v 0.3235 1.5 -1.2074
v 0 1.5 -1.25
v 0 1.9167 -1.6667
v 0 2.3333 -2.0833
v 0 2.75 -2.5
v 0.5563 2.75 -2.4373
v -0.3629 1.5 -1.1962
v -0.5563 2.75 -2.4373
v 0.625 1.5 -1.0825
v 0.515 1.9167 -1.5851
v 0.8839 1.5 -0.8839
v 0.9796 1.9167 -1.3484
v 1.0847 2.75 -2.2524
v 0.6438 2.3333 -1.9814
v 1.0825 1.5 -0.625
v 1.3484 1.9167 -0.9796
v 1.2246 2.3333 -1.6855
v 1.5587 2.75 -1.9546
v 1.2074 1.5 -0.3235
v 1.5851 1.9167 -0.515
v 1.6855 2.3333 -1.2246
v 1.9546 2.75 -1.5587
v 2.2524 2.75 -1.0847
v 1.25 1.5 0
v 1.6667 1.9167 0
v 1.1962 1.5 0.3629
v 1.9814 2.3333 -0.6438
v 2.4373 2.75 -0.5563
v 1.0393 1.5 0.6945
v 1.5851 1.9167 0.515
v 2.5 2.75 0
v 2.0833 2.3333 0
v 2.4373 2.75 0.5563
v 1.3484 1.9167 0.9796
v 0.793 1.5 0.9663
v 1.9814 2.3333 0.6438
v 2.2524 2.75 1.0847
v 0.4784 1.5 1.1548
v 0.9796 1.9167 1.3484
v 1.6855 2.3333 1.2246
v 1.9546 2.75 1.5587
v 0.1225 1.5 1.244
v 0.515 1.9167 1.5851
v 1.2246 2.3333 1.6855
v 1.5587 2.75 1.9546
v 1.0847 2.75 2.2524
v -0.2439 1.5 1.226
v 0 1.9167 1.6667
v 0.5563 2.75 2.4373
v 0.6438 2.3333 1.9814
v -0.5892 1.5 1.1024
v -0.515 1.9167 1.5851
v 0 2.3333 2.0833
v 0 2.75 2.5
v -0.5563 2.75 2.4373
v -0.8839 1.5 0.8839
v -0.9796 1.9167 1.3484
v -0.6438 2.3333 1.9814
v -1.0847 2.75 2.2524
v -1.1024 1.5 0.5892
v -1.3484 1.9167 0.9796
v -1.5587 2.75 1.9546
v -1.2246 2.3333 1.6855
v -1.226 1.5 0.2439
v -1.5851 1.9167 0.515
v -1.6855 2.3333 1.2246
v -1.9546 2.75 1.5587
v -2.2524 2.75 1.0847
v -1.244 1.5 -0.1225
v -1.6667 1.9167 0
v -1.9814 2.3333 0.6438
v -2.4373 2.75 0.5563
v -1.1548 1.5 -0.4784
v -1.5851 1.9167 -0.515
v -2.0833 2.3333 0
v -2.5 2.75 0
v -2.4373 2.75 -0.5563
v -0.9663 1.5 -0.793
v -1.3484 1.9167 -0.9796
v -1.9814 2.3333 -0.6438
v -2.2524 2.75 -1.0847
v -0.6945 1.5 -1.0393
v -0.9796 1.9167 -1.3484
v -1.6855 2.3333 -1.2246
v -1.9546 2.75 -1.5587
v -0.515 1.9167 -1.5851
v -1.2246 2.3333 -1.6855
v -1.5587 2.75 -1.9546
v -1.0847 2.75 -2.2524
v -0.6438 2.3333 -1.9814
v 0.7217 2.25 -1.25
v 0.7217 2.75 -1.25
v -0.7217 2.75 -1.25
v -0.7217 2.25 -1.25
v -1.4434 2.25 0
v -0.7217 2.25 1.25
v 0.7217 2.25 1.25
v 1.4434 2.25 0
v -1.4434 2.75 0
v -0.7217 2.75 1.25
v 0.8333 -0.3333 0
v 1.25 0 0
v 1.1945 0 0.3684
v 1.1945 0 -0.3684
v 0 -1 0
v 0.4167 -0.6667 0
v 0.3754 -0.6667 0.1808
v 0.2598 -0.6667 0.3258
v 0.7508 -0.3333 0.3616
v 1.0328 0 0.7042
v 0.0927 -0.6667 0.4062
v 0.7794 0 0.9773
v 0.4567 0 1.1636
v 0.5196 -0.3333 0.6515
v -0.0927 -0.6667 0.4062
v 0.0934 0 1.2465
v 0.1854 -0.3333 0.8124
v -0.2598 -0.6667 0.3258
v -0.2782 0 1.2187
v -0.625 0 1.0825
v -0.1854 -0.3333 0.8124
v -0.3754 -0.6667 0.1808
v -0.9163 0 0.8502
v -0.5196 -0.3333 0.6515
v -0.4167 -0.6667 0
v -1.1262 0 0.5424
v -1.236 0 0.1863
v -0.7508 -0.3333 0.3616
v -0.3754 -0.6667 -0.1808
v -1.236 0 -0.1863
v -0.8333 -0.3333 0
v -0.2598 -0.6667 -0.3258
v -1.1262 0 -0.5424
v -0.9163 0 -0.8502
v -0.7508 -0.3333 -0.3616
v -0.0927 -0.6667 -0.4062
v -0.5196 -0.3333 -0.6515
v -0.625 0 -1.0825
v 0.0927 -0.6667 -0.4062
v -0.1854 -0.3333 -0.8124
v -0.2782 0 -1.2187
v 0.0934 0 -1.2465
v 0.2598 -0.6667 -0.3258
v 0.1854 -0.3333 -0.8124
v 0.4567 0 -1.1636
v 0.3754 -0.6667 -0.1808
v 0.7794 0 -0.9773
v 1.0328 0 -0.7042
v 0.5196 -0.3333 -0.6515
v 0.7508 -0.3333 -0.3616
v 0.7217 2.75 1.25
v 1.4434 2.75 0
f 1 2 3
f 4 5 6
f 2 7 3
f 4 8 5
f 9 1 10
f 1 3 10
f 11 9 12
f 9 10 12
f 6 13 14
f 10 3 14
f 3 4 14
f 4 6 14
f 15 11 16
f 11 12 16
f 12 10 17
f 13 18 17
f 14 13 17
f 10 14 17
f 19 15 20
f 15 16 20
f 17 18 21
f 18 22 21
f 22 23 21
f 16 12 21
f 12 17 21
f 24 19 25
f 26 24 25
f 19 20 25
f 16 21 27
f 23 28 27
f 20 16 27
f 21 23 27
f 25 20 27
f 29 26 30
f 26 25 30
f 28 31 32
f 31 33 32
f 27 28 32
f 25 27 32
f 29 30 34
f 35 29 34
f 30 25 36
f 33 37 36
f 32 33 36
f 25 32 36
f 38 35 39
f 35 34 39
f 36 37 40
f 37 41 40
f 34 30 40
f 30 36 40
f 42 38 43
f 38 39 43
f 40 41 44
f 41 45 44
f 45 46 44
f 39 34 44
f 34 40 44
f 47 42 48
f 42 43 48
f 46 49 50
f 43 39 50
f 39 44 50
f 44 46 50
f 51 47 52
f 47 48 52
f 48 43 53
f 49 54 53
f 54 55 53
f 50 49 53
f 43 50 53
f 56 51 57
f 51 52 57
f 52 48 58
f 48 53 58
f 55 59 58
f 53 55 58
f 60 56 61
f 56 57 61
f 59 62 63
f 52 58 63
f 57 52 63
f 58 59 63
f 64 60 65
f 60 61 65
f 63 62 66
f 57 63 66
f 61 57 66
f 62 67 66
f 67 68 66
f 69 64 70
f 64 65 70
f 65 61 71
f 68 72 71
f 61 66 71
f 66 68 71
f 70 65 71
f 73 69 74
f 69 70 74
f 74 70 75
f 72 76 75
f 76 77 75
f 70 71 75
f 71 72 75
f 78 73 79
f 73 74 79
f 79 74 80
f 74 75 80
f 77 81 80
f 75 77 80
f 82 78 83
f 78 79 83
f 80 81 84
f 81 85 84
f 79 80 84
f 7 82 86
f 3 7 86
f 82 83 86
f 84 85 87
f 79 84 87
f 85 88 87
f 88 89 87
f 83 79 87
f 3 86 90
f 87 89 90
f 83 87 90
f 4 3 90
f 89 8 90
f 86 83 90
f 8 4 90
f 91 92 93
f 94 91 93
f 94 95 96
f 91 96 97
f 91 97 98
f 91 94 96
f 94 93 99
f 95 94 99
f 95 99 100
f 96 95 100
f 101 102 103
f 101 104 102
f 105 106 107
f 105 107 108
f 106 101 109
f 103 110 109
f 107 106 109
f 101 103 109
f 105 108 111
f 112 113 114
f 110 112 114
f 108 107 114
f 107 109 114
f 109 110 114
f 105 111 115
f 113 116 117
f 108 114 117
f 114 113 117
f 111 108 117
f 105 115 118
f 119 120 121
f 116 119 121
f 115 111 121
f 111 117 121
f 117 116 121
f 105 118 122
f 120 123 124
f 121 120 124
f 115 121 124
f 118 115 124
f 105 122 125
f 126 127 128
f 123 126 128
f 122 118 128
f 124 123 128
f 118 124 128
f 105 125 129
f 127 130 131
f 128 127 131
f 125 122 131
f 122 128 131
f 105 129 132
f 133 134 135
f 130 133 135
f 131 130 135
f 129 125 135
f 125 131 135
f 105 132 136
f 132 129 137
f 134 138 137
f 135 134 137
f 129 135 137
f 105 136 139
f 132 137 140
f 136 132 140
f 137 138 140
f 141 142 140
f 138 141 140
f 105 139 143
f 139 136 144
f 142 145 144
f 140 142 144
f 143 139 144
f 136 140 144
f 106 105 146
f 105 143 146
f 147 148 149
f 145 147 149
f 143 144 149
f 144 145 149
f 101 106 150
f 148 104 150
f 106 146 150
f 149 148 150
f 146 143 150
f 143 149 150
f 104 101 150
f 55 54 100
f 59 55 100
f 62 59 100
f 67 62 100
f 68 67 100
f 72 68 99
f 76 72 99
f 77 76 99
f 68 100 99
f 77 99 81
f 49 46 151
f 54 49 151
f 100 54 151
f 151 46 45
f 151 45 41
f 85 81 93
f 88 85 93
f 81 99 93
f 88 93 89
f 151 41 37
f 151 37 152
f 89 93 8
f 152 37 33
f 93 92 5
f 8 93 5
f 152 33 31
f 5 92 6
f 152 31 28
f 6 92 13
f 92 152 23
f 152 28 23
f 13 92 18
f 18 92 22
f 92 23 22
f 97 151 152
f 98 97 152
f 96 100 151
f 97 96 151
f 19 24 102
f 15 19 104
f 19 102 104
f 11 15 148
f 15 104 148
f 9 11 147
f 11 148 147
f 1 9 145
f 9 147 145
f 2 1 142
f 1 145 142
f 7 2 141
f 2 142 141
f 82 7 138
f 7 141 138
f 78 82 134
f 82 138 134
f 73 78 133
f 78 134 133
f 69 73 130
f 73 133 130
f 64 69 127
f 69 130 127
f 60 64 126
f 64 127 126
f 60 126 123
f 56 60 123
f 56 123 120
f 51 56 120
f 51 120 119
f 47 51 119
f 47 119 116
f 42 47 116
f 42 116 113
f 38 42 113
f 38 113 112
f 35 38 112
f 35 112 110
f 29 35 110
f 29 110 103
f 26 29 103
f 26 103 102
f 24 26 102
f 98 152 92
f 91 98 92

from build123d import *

# Parameters (mm, degrees)
CROQUIS1_R              = 1.25
SALIENTE_EXTRUIR1_DEPTH = 1.5
CORTAR_EXTRUIR1_DEPTH   = 0.5


with BuildPart() as part:
    # Croquis1 → Saliente-Extruir1 (new body)
    with BuildSketch(Plane(origin=(0, 0, 0), x_dir=(1, 0, 0), z_dir=(0, 1, 0))):
        Circle(CROQUIS1_R)
    extrude(amount=SALIENTE_EXTRUIR1_DEPTH)

    # Croquis2 one side → Revolución1 (revolve)
    with BuildSketch(Plane(origin=(0, 0, 0), x_dir=(0, 0, -1), z_dir=(1, 0, 0))):
        Polygon((0, 2.75), (0, 1.5), (1.25, 1.5), (2.5, 2.75), align=None)
    revolve(axis=Axis((0, 2.75, 0), (0, -1, 0)))

    # Croquis3 → Cortar-Extruir1 (cut)
    with BuildSketch(Plane(origin=(0, 2.75, 0), x_dir=(1, 0, 0), z_dir=(0, 1, 0))):
        Polygon((1.443375673, 0), (0.721687836, 1.25), (-0.721687836, 1.25), (-1.443375673, 0), (-0.721687836, -1.25), (0.721687836, -1.25), align=None)
    extrude(amount=-CORTAR_EXTRUIR1_DEPTH, mode=Mode.SUBTRACT)

    # Croquis4 one side → Revolución2 (revolve)
    with BuildSketch(Plane.XY):
        Polygon((0, 0), (0, -1), (1.25, 0), align=None)
    revolve(axis=Axis((0, 0, 0), (0, -1, 0)))


solid = part.part
